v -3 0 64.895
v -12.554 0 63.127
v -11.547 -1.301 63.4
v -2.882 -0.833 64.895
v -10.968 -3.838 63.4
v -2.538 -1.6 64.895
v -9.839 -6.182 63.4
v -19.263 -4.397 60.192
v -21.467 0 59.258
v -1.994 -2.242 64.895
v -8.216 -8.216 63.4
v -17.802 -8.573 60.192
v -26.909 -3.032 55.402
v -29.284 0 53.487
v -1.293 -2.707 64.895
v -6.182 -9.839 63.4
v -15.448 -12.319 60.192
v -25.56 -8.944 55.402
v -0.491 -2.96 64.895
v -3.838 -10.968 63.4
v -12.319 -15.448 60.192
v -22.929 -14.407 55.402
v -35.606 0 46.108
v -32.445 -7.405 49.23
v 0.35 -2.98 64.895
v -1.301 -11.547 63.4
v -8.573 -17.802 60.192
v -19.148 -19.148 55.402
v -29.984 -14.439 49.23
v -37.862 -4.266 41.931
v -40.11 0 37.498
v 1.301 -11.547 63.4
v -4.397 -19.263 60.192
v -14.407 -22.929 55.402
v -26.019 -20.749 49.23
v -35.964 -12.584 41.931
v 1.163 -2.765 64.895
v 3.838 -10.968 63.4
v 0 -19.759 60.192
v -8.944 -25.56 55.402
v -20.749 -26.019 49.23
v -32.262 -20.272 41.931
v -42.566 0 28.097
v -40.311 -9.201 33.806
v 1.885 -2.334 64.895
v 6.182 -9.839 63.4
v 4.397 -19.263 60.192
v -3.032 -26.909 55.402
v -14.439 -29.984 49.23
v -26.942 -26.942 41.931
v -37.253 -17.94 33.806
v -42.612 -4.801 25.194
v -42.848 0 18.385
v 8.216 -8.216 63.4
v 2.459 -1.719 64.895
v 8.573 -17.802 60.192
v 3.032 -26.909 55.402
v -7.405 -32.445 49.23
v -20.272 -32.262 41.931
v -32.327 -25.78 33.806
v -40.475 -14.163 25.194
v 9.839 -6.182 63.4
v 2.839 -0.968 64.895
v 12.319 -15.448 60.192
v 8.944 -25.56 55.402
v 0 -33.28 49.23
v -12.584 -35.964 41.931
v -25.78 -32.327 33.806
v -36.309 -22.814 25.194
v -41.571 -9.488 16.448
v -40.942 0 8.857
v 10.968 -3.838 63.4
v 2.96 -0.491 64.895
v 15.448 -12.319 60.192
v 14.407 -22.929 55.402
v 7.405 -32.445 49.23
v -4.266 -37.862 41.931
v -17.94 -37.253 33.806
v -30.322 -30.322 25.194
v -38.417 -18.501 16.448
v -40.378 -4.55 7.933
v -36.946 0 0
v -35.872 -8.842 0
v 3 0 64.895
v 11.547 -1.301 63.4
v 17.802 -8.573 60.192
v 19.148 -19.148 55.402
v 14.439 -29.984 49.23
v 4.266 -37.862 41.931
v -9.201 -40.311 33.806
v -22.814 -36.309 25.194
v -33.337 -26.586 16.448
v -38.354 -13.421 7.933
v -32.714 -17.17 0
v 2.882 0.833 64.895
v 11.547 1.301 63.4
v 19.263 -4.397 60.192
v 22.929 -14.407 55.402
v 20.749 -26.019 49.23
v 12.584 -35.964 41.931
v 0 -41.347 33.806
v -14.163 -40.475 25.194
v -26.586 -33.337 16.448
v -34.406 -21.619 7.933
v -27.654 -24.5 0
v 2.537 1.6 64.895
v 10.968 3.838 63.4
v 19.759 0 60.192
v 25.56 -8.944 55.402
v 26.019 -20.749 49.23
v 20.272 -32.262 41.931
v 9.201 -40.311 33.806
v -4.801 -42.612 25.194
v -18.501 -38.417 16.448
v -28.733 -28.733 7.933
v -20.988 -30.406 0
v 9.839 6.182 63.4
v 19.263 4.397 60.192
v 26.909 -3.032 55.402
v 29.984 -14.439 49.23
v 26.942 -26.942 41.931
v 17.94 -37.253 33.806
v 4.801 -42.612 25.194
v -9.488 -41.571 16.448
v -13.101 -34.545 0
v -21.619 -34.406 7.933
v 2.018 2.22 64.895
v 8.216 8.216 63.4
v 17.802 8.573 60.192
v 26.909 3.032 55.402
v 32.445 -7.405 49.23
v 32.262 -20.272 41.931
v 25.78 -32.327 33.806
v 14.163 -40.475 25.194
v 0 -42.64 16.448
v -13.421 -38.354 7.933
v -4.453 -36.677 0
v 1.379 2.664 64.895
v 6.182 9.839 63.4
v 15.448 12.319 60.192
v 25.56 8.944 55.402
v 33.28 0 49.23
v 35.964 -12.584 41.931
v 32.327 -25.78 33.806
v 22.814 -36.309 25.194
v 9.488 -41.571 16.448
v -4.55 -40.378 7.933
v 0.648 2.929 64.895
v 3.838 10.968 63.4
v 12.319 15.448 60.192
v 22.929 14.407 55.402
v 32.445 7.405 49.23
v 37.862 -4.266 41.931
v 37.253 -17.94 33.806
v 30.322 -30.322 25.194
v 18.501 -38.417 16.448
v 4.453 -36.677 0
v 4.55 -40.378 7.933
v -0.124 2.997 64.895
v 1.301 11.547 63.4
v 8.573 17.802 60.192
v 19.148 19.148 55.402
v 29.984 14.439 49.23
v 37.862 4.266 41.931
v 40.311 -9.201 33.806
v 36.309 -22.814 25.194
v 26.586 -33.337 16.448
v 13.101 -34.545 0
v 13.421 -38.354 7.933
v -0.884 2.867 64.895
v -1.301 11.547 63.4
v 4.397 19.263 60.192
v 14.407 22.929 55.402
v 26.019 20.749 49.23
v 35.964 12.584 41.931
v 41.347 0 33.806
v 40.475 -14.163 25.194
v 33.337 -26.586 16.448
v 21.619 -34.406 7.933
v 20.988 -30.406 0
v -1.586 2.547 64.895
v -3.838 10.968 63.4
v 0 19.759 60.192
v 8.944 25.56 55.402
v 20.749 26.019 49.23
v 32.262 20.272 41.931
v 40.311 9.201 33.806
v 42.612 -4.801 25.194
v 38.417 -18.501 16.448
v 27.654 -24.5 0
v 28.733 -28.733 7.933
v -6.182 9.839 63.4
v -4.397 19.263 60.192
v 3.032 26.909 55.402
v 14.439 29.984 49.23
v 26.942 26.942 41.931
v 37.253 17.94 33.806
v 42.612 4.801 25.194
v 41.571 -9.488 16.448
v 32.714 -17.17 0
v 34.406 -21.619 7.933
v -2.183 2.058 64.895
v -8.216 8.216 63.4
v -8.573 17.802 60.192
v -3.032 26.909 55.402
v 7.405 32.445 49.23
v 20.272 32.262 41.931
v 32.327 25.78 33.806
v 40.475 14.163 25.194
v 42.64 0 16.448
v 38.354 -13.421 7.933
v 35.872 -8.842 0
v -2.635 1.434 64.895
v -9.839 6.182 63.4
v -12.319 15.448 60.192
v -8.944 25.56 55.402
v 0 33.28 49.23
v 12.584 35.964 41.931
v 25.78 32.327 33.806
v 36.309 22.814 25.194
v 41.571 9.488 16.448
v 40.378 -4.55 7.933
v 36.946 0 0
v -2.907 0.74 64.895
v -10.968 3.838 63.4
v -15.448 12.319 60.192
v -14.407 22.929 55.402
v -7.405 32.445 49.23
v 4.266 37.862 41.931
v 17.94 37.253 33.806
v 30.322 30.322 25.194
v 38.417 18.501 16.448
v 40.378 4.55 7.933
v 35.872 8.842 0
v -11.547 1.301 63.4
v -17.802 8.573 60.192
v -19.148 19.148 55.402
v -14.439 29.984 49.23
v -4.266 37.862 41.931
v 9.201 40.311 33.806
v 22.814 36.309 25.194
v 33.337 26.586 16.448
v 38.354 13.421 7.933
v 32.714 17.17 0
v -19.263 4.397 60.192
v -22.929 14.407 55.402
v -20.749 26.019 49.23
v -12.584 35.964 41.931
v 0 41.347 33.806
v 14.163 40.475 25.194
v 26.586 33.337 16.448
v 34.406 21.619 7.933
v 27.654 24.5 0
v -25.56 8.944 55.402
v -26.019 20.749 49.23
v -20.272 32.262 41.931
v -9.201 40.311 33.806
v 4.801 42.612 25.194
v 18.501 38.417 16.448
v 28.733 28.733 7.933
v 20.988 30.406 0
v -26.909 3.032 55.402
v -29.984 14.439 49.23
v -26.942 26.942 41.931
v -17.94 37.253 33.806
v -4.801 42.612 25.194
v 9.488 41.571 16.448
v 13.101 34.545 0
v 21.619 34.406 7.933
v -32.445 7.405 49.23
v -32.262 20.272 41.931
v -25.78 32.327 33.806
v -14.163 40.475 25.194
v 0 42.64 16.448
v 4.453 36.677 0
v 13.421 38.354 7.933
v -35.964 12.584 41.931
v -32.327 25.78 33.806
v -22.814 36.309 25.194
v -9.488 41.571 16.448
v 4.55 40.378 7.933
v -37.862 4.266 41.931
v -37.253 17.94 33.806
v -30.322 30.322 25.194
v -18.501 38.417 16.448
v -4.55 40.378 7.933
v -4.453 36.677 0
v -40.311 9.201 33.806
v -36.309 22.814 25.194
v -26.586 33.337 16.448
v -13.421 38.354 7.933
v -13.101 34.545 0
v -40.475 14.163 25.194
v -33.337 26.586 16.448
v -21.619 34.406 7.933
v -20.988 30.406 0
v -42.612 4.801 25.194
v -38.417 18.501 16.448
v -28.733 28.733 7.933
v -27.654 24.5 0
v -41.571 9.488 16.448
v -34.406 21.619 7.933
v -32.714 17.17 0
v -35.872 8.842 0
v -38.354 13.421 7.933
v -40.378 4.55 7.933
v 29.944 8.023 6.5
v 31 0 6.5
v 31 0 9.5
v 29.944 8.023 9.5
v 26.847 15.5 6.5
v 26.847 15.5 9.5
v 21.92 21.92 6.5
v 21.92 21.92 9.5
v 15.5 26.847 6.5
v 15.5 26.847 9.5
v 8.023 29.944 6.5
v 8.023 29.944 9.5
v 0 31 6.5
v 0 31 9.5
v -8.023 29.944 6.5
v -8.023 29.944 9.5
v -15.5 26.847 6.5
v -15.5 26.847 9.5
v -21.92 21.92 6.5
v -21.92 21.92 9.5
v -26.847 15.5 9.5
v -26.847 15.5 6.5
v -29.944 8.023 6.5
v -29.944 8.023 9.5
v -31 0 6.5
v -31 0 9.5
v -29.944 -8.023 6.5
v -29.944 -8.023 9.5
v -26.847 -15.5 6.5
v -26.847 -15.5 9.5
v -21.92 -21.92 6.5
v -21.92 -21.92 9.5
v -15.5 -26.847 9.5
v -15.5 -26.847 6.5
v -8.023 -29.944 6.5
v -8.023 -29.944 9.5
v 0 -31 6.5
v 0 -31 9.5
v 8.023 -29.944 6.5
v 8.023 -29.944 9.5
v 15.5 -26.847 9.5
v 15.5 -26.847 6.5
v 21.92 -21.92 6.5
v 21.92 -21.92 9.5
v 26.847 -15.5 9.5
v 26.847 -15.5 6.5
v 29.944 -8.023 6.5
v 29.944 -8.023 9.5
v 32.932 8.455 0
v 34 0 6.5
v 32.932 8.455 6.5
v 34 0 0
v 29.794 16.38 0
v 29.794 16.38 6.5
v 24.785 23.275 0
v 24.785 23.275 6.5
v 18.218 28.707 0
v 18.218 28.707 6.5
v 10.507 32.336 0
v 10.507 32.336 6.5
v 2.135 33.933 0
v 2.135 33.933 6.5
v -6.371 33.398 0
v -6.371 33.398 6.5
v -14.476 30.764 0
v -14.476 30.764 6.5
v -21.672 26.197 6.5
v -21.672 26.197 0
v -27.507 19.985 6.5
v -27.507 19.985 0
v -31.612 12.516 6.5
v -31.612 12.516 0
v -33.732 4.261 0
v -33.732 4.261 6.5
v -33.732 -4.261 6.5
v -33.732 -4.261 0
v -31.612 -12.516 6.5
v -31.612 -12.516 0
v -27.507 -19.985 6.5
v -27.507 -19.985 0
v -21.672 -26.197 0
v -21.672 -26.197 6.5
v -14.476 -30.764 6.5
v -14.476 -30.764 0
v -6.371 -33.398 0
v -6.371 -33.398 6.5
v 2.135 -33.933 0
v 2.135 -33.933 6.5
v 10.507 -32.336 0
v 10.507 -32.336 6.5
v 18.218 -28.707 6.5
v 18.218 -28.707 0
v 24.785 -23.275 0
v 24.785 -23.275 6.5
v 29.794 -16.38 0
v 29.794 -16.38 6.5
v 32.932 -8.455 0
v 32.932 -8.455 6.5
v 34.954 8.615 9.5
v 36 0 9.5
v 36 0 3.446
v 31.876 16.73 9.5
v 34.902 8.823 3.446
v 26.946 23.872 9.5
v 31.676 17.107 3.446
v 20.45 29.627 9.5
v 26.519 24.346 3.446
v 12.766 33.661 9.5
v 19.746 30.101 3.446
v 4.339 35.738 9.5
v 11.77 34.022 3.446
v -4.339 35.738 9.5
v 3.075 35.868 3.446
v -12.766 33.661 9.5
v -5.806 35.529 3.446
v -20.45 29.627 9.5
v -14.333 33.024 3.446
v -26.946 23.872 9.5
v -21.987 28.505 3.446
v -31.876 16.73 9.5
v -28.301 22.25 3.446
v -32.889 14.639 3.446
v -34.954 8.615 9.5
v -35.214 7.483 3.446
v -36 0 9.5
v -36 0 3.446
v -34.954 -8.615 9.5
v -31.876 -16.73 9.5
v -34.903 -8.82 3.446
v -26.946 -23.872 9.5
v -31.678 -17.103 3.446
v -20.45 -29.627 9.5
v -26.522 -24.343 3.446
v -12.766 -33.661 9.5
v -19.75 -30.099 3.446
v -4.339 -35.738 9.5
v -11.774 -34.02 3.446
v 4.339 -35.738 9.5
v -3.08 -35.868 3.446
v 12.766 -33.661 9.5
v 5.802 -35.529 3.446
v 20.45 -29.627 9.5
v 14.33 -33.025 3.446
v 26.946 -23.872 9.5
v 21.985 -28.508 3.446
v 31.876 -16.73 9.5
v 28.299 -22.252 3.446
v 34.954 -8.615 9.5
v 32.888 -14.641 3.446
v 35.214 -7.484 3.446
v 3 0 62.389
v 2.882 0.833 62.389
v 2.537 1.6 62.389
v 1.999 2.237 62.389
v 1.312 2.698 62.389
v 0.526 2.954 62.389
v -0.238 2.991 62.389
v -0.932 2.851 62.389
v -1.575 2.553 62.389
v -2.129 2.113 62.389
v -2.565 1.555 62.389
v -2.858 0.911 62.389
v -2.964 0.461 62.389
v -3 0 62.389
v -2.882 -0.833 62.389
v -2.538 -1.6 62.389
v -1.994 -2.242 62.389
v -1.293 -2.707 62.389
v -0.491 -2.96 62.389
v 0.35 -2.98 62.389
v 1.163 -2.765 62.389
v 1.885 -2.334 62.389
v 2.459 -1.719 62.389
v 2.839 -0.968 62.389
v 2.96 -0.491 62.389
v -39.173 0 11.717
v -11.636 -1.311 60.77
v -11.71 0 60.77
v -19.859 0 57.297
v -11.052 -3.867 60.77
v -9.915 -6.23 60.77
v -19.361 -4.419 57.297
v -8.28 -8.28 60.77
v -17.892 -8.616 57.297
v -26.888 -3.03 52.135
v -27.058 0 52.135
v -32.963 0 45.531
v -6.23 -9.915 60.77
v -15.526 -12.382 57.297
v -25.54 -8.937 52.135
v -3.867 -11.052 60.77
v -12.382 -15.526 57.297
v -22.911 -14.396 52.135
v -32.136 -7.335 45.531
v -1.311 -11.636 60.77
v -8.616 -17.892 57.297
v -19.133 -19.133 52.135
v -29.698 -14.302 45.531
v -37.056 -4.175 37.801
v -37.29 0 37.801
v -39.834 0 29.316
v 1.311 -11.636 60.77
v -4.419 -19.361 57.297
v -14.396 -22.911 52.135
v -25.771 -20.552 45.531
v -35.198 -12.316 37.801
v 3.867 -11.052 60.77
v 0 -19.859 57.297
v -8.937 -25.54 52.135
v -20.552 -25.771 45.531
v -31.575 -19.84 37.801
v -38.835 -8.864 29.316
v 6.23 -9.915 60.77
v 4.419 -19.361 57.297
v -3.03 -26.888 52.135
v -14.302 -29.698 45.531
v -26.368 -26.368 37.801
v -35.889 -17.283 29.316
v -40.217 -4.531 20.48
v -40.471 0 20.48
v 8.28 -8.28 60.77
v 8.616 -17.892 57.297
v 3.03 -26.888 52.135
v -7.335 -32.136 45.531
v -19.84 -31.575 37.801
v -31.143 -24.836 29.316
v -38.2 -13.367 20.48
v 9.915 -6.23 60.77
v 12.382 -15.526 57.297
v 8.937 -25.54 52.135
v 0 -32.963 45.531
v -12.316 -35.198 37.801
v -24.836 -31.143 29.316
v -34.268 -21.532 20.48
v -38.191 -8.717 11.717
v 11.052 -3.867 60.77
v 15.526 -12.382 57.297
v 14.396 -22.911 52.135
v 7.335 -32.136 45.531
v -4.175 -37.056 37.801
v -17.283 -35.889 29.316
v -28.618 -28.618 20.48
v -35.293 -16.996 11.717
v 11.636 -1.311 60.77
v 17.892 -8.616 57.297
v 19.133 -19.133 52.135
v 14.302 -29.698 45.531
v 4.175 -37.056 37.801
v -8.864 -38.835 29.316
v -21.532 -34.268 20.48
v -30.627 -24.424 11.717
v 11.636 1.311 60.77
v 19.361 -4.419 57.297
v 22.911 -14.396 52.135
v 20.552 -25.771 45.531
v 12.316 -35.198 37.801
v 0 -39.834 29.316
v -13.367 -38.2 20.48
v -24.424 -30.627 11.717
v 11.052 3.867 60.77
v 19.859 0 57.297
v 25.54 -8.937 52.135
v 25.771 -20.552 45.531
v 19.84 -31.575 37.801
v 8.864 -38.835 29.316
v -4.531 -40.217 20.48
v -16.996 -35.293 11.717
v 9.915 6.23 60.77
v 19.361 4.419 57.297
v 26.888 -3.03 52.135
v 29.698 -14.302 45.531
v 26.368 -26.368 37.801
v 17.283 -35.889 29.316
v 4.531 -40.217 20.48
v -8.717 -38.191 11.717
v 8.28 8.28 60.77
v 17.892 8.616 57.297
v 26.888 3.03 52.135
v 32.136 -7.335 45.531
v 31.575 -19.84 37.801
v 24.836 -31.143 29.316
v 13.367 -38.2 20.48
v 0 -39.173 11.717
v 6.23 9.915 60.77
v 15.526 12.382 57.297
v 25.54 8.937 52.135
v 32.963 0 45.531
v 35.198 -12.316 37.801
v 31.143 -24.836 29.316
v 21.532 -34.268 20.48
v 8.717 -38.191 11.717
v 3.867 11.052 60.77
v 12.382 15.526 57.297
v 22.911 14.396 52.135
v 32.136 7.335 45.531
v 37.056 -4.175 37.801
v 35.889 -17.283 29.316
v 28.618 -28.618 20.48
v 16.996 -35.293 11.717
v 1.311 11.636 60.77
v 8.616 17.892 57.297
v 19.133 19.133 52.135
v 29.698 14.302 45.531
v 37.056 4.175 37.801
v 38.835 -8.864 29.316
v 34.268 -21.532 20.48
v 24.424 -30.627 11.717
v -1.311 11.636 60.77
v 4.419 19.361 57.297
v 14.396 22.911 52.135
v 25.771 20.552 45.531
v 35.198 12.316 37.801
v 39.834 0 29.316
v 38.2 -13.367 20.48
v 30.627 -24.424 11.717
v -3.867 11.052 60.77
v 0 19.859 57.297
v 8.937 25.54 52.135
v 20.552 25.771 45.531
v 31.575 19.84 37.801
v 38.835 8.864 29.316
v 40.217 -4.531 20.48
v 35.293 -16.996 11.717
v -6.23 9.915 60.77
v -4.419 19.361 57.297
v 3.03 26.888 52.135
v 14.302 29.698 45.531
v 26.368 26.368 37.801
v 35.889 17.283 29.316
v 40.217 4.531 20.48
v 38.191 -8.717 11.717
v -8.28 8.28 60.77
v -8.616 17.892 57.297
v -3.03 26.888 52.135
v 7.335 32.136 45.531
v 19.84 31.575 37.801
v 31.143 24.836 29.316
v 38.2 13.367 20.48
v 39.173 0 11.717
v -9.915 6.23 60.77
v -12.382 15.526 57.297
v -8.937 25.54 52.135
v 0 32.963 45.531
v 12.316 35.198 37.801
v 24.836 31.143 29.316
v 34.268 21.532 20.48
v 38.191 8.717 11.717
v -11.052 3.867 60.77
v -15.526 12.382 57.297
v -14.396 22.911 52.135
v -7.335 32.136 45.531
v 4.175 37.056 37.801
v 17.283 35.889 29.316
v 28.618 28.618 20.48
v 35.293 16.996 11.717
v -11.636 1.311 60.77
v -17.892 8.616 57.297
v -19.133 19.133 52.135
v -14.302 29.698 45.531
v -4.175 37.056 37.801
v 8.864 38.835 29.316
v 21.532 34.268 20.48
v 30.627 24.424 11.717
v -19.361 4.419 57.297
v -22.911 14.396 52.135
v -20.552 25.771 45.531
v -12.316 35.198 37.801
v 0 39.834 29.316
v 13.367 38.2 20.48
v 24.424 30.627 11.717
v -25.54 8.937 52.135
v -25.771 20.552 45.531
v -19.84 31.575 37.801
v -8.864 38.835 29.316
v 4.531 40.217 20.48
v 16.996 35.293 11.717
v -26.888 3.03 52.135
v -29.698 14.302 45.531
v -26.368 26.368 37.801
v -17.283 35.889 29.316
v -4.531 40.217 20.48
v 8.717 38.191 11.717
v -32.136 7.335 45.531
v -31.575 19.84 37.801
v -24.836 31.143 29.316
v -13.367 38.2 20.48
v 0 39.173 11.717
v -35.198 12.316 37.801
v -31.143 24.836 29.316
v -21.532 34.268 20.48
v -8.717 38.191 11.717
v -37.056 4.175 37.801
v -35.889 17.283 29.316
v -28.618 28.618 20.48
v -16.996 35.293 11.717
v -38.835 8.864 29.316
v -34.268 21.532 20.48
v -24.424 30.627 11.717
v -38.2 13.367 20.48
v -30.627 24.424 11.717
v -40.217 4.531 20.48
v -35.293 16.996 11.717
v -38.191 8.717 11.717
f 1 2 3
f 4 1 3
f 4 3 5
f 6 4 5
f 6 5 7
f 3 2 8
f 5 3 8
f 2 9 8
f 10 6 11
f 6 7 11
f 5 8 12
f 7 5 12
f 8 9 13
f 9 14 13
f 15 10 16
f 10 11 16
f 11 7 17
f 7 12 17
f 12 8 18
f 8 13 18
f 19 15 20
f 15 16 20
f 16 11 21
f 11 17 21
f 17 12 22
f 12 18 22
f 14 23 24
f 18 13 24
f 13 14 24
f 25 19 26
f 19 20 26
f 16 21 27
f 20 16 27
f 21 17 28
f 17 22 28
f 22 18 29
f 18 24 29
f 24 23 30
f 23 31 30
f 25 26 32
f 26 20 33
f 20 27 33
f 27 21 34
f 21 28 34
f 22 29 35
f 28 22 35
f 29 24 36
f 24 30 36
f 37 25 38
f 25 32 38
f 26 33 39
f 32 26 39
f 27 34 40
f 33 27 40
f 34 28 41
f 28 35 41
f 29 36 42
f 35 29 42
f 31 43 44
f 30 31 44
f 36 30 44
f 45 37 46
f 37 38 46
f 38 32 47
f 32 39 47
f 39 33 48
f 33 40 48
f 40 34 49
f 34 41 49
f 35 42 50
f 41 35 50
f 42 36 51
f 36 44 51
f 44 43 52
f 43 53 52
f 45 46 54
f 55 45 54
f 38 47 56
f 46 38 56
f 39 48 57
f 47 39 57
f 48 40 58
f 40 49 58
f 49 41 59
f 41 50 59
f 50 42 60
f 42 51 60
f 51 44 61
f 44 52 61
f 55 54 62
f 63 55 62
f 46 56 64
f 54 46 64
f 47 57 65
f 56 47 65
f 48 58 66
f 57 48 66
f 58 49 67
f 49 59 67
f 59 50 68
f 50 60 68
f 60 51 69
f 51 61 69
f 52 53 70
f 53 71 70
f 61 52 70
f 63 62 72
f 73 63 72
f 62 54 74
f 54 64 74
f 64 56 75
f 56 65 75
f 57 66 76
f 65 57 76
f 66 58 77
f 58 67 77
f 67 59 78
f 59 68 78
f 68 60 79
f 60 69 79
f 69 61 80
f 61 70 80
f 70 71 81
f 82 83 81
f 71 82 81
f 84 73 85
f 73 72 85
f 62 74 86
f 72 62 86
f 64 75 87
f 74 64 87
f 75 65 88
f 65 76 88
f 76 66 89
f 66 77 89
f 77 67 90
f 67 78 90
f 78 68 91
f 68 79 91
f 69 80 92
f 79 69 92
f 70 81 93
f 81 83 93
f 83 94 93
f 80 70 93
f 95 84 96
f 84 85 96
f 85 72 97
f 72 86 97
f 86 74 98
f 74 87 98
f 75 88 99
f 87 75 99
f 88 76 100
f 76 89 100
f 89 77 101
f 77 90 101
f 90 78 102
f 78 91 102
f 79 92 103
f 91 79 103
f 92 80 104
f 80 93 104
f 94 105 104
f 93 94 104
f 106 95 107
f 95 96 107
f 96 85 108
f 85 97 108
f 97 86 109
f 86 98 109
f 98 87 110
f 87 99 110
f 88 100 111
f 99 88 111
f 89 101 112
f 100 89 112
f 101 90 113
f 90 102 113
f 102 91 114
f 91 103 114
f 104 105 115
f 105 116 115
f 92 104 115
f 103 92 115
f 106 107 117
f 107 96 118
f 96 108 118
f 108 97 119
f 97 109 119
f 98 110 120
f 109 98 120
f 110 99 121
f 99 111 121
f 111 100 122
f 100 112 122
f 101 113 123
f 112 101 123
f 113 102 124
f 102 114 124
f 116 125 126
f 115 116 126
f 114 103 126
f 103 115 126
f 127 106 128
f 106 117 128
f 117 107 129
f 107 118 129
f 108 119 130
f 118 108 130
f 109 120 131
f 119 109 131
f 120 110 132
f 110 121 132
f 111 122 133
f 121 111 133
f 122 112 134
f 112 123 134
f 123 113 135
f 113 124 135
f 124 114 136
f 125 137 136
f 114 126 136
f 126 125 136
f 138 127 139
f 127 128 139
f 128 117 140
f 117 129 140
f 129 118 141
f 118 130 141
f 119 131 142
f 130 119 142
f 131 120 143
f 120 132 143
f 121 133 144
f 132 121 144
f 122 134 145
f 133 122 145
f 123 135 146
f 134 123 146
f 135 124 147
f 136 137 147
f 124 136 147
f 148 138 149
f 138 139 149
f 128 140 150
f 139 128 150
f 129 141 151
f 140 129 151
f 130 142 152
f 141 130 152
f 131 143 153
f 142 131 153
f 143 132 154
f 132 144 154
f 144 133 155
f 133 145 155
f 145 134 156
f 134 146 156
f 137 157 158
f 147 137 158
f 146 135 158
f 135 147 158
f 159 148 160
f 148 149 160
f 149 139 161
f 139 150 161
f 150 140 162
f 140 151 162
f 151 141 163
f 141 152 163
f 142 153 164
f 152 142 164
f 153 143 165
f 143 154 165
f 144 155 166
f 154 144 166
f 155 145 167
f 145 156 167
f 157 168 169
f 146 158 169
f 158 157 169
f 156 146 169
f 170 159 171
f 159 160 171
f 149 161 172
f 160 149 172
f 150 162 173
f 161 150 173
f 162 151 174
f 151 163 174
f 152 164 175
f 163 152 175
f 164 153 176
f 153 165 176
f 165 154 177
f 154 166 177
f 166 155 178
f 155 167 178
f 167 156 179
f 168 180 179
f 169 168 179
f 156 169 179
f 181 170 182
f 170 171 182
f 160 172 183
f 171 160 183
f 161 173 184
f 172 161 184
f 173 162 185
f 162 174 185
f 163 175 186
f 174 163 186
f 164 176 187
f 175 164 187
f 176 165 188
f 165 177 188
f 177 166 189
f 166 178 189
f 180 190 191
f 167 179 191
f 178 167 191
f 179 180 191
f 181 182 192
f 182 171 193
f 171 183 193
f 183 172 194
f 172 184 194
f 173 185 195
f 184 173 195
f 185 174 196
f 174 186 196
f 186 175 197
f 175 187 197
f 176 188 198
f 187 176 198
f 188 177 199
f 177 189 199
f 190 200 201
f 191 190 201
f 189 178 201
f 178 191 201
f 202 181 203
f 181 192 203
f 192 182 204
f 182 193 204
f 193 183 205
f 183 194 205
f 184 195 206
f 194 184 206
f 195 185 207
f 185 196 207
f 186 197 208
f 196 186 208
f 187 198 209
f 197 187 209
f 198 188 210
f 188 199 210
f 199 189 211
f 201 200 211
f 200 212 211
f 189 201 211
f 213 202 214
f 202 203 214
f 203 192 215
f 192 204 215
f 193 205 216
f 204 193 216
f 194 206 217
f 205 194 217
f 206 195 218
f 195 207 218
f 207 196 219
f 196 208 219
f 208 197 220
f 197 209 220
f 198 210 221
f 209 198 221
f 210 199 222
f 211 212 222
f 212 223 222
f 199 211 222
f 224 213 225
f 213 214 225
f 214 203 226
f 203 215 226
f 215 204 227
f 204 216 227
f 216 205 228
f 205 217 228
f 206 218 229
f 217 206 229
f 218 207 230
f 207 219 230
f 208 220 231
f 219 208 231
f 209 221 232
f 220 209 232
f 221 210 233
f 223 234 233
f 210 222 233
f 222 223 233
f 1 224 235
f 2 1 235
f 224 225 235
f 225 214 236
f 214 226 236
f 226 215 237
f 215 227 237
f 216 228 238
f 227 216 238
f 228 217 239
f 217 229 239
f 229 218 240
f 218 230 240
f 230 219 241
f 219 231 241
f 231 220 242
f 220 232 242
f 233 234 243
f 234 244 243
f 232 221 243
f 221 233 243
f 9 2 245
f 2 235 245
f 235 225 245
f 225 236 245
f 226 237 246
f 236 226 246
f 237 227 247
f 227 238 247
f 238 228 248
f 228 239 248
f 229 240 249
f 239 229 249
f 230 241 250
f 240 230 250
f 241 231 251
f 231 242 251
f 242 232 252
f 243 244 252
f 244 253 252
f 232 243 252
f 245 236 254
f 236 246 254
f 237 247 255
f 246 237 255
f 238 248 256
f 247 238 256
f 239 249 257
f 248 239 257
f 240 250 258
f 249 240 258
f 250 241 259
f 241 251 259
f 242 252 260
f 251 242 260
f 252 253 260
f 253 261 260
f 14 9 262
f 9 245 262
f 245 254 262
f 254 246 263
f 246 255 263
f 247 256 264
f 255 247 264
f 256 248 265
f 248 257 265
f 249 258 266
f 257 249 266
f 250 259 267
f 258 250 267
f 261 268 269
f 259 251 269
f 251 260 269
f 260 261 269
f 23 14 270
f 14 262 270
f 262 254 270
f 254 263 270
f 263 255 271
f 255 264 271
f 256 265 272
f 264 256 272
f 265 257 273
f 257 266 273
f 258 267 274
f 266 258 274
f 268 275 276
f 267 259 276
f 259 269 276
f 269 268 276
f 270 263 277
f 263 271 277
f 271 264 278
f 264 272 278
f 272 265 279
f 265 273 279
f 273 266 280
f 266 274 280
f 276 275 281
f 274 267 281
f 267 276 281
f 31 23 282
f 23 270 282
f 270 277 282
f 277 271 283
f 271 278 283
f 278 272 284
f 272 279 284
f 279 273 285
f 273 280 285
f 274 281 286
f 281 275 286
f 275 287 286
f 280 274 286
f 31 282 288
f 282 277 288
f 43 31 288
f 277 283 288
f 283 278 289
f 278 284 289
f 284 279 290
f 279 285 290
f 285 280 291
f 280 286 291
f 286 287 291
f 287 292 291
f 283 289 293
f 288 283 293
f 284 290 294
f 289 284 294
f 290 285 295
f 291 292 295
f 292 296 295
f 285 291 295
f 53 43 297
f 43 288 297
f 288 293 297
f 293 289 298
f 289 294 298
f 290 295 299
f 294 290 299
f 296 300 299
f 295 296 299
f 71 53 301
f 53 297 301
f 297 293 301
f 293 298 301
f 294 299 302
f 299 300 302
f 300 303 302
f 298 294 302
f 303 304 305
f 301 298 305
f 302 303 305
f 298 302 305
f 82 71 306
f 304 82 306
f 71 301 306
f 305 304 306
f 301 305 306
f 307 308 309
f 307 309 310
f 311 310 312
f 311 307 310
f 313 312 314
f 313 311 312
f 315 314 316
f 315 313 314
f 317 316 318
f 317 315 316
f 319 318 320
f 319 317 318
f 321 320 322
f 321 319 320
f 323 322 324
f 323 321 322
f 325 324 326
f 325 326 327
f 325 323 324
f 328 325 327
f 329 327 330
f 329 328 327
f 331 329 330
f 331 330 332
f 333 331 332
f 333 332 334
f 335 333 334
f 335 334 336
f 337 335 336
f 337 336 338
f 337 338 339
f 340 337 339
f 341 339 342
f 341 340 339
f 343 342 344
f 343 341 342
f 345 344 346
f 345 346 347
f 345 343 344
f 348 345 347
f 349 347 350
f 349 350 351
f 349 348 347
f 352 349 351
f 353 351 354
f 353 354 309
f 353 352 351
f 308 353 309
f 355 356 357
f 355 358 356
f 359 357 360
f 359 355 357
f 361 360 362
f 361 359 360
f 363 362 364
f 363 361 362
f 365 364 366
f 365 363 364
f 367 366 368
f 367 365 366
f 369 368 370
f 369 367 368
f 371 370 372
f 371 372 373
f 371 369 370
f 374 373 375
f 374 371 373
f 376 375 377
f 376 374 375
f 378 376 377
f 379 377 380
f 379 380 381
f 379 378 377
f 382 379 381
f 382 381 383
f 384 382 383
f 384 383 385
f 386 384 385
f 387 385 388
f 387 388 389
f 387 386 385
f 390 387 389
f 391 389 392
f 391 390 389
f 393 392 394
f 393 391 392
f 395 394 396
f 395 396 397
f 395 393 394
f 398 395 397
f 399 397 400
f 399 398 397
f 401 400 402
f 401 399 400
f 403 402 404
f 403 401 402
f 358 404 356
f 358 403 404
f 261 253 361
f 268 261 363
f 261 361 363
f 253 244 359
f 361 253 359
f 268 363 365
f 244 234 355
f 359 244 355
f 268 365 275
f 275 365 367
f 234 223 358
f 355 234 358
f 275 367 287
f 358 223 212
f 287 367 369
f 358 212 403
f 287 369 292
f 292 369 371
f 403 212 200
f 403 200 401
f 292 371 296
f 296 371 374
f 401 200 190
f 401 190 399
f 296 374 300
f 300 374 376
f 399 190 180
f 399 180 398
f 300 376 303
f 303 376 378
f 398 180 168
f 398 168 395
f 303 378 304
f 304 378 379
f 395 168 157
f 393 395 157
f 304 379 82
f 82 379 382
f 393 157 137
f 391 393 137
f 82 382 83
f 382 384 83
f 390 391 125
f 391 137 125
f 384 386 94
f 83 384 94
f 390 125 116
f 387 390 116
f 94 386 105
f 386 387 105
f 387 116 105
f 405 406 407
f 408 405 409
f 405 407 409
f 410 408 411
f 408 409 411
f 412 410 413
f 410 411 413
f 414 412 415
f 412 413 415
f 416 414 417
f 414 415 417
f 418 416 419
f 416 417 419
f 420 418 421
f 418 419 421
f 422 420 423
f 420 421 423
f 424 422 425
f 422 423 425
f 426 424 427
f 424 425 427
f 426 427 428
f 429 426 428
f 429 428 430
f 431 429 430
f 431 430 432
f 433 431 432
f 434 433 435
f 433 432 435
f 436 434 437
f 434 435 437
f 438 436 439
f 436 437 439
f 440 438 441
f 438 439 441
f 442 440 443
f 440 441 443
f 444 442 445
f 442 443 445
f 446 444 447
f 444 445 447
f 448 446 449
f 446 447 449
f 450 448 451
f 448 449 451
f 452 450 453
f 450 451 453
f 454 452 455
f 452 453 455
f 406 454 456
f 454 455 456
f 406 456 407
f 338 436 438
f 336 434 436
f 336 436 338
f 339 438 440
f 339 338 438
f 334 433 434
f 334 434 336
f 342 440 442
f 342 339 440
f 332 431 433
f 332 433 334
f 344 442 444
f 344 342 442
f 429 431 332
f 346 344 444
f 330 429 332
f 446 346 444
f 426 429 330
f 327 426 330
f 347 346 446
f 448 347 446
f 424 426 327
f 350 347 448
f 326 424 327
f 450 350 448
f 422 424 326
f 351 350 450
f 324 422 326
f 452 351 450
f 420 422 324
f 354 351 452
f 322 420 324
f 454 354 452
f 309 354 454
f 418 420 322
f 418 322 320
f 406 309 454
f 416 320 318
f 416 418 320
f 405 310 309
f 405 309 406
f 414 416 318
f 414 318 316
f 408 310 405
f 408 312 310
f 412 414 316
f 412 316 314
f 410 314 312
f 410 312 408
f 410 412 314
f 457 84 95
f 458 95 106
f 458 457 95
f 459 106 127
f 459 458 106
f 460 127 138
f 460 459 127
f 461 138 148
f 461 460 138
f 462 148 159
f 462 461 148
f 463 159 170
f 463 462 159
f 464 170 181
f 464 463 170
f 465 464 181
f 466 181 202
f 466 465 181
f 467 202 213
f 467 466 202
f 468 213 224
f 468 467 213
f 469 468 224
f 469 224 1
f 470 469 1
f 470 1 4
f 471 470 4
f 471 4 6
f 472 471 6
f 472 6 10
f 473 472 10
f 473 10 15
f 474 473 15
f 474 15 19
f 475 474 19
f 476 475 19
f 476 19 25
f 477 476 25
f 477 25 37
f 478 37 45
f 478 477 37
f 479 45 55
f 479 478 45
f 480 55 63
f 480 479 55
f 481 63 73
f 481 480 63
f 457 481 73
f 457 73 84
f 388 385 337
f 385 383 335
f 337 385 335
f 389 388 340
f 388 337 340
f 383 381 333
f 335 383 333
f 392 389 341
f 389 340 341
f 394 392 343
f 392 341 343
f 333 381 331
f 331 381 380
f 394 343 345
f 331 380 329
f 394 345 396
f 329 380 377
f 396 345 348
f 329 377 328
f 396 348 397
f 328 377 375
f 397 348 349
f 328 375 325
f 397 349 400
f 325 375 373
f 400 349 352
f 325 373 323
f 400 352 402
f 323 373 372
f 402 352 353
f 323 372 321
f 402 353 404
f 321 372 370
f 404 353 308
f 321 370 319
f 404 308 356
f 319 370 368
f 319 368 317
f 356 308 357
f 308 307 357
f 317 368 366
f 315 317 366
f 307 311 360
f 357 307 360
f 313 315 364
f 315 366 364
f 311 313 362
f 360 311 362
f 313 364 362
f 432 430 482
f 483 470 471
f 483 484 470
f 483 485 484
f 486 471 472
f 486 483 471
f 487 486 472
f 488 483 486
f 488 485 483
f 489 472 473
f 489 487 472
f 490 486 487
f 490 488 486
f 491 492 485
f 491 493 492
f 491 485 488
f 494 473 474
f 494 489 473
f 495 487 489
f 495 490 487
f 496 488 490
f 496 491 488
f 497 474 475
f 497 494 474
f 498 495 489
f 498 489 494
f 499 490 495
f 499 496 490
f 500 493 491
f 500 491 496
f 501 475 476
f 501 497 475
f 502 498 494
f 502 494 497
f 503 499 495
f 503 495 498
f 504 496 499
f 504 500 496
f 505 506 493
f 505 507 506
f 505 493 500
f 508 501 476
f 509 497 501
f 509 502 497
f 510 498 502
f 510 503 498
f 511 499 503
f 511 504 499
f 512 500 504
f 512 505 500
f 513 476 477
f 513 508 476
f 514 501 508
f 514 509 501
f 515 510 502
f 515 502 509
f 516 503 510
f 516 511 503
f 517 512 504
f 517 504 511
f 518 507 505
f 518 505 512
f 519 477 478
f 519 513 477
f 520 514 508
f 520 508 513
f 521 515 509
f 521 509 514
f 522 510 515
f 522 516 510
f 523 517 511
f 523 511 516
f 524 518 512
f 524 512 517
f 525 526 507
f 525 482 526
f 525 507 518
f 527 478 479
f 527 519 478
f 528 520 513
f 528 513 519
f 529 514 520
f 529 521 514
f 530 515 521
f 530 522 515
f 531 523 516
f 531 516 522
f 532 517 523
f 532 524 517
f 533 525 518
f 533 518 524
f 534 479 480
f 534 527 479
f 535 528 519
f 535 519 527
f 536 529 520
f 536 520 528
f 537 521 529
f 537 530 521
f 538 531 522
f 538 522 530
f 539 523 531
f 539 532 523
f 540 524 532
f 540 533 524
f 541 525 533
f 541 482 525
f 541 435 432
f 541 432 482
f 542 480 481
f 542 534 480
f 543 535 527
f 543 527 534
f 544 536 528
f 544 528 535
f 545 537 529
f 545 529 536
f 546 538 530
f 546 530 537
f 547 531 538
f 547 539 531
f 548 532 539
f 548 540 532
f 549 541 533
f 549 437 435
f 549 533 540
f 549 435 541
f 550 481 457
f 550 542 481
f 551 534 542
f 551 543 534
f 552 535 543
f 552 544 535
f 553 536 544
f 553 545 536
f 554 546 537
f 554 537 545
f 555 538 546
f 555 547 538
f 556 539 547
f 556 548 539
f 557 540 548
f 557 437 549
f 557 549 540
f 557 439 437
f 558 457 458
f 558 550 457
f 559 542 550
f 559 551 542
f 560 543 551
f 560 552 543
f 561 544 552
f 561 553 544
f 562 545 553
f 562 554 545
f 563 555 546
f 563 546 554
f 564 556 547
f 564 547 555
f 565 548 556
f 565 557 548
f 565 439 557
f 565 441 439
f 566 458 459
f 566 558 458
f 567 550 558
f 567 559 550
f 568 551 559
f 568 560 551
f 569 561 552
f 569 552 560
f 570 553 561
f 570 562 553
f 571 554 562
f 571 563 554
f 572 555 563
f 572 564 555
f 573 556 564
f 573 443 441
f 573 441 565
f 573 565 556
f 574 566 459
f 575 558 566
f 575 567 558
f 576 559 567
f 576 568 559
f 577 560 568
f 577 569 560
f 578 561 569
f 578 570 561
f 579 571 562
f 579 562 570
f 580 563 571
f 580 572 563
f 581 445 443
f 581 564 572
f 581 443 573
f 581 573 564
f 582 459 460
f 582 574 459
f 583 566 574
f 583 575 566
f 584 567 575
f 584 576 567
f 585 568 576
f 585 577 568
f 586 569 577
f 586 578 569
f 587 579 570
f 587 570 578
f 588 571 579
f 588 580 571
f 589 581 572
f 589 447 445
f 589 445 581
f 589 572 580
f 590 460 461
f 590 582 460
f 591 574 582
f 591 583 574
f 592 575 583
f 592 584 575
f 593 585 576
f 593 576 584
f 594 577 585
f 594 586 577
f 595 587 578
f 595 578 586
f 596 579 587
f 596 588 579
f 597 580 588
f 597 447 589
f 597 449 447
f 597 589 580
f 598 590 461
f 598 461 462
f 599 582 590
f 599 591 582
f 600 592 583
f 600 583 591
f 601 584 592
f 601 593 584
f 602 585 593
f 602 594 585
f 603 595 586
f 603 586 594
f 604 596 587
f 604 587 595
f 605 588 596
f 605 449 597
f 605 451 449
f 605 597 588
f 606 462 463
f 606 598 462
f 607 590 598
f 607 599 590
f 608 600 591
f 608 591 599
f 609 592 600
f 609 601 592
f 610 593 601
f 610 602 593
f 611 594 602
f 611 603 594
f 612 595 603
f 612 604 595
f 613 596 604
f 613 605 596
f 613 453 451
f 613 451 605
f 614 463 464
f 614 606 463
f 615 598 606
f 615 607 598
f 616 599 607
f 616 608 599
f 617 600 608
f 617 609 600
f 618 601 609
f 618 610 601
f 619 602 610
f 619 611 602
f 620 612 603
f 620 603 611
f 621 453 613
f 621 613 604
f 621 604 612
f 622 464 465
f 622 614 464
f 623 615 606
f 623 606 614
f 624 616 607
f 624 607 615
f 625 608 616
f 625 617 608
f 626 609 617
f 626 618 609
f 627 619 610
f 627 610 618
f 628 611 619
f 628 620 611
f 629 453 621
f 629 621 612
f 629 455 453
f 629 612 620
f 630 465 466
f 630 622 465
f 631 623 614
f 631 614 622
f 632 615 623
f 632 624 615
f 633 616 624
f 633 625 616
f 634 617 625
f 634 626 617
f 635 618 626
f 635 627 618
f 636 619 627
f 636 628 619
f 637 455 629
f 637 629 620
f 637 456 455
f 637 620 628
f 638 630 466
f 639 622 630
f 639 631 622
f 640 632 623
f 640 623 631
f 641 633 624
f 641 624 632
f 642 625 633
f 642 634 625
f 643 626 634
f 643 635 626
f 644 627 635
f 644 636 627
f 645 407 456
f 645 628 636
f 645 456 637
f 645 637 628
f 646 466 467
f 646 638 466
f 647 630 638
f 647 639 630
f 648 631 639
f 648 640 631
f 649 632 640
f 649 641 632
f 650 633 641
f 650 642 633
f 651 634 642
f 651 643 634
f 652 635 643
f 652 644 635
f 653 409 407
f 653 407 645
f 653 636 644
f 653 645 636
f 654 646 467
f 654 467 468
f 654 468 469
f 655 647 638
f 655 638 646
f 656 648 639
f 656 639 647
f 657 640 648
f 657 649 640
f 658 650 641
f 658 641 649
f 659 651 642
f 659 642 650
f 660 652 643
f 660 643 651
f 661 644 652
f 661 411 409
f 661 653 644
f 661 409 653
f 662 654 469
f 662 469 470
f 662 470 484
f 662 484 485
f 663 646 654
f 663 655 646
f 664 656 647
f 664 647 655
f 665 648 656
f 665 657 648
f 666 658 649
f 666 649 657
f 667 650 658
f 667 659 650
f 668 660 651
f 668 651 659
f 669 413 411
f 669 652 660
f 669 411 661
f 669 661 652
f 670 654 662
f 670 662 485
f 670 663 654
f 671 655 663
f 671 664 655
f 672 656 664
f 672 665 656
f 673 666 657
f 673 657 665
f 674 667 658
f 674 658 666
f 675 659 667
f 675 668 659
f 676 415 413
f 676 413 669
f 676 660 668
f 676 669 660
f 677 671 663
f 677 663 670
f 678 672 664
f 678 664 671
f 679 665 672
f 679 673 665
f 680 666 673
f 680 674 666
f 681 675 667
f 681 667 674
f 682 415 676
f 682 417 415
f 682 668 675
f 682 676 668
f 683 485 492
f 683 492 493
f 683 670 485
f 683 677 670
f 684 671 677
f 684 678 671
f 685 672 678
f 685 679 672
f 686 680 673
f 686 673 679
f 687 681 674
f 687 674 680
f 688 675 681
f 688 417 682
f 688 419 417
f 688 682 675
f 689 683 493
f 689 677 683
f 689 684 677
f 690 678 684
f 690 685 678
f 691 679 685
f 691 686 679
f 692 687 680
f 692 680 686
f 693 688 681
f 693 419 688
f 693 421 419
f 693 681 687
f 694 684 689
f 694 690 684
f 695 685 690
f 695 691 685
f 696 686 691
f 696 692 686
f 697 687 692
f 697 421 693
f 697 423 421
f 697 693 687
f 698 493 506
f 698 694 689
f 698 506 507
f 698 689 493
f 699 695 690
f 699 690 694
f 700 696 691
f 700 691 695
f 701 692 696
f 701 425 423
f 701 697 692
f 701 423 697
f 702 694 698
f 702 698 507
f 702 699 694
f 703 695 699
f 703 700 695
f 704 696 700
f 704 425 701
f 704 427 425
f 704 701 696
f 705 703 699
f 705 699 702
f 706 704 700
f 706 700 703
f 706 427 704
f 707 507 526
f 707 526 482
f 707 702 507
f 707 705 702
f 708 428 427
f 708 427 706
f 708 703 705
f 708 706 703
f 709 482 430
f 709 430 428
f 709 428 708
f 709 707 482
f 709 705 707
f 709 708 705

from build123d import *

# Parameters (mm, degrees)
F2_T      = -2.5
F3_R      = 34
F4_DEPTH  = 4.2
F6_R      = 3
F7_DEPTH  = 14
F8_R      = 36
F8_R_2    = 34
F9_DEPTH  = 4
F10_R     = 36
F10_R_2   = 31
F11_DEPTH = 3


with BuildPart() as f1:
    # F0 (on Front) → F1 (revolve)
    with BuildSketch(Plane.XZ):
        with BuildLine():
            Line((0, 0), (0, 65))
            ThreePointArc((0, 65), (-37.383151285, 43.2485293609), (-36.9459064038, 0))
            Line((-36.9459064038, 0), (0, 0))
        make_face()
    revolve(axis=Axis((0, 0, 20.3252808475), (0, 0, 1)))

    # F2 (hollow: no face is removed)
    offset(amount=F2_T, mode=Mode.SUBTRACT)

    # F3 (on face) → F4 (cut)
    with BuildSketch(Plane(origin=(0, 0, 0), x_dir=(1, 0, 0), z_dir=(0, 0, -1))):
        Circle(F3_R)
    extrude(amount=-F4_DEPTH, mode=Mode.SUBTRACT)

    # F6 (on offset) → F7 (cut)
    with BuildSketch(Plane.XY.offset(52)):
        Circle(F6_R)
    extrude(amount=F7_DEPTH, mode=Mode.SUBTRACT)

    # F8 (on face) → F9 (join)
    with BuildSketch(Plane.XY.offset(2.5)):
        Circle(F8_R)
        Circle(F8_R_2, mode=Mode.SUBTRACT)
    extrude(amount=F9_DEPTH)

    # F10 (on face) → F11 (join)
    with BuildSketch(Plane.XY.offset(6.5)):
        Circle(F10_R)
        Circle(F10_R_2, mode=Mode.SUBTRACT)
    extrude(amount=F11_DEPTH)


solid = f1.part
